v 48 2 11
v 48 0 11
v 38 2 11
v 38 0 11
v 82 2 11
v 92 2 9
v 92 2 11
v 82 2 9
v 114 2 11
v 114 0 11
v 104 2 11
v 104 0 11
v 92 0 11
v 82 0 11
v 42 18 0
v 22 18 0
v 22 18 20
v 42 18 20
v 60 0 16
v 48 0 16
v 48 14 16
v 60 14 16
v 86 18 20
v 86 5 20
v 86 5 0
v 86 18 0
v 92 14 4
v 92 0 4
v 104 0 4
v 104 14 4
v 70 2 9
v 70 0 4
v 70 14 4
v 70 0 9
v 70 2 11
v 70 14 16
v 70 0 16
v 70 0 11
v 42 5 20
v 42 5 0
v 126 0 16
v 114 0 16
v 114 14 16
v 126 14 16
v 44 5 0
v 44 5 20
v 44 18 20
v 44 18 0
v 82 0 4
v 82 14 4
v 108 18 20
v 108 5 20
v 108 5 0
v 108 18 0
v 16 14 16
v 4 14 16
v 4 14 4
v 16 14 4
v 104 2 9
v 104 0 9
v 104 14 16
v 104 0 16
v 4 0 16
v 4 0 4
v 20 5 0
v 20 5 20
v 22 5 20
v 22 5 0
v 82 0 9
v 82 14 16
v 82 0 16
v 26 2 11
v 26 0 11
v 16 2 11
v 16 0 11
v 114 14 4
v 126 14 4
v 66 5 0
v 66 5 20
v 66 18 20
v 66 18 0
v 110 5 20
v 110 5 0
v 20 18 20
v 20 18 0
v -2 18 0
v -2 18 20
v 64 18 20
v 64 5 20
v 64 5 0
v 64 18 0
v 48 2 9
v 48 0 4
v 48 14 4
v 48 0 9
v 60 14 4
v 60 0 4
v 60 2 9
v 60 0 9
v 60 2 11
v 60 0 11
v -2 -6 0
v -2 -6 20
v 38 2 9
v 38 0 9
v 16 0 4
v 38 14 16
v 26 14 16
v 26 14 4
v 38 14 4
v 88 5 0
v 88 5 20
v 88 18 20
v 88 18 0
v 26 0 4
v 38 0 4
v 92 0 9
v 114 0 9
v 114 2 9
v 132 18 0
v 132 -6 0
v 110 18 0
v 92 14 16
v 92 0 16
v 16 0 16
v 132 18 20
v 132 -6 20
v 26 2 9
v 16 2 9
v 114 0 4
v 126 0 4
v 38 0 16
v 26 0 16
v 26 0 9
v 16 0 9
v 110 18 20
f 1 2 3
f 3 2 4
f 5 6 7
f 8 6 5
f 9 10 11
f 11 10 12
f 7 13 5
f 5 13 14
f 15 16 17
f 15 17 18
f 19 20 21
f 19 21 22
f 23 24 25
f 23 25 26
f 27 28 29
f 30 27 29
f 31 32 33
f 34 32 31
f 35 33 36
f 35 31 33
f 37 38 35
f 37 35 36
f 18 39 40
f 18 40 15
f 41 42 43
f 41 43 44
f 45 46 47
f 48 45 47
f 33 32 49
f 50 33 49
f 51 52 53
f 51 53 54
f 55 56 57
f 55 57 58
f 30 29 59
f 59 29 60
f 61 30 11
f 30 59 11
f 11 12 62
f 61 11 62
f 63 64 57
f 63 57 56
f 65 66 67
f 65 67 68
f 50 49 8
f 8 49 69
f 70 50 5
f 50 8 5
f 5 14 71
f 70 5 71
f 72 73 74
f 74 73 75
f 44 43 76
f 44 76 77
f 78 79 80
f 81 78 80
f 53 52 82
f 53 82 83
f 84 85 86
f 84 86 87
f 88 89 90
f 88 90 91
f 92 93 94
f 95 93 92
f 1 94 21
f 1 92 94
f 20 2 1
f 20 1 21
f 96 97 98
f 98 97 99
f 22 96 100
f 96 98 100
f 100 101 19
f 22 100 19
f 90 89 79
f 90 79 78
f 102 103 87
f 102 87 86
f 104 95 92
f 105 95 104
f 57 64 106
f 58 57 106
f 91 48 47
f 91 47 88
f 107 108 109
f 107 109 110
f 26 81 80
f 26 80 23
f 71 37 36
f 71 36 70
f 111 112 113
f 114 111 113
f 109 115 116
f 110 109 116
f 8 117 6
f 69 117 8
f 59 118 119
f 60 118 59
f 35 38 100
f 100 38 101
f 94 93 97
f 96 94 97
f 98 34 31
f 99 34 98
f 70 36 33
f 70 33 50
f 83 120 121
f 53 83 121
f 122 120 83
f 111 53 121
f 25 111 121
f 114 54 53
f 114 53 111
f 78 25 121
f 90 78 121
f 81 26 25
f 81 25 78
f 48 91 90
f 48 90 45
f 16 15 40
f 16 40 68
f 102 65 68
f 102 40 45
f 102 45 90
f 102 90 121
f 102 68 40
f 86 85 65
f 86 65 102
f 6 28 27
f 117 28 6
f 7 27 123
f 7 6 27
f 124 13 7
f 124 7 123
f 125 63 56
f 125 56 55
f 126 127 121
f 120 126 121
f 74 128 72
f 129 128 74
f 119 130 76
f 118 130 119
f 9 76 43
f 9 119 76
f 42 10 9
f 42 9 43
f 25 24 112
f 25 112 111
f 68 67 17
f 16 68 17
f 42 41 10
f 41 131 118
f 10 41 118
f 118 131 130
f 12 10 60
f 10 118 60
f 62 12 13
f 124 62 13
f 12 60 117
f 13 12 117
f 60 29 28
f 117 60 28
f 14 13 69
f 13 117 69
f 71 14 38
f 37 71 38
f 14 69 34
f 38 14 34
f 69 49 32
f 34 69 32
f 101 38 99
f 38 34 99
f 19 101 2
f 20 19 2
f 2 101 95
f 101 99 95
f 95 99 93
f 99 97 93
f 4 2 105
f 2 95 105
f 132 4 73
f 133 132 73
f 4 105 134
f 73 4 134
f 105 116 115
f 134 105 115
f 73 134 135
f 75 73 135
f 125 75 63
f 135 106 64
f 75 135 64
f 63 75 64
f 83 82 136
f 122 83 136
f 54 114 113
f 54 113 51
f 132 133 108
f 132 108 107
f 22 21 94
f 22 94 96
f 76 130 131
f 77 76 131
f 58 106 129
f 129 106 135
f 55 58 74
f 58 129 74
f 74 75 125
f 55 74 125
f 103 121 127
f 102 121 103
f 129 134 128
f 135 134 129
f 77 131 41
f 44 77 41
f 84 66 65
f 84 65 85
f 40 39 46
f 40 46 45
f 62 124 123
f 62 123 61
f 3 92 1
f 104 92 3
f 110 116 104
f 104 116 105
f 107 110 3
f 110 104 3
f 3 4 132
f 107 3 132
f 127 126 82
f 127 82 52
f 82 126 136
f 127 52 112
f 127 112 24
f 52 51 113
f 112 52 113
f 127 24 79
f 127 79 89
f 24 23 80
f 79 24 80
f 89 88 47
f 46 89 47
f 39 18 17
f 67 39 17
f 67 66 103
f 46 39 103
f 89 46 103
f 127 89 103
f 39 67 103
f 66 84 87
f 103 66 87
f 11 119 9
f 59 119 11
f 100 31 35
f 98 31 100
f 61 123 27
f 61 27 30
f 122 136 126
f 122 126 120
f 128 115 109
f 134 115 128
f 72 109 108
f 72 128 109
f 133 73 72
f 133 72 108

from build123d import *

# Parameters (mm, degrees)
SKETCH1_W           = 20
SKETCH1_H           = 18
BOSS_EXTRUDE1_DEPTH = 20
SKETCH2_W           = 12
SKETCH2_H           = 12
CUT_EXTRUDE1_DEPTH  = 14
SKETCH3_W           = 20
SKETCH3_H           = 5
BOSS_EXTRUDE2_DEPTH = 2
LPATTERN1_COUNT     = 6
LPATTERN1_PITCH     = 22
SKETCH4_W           = 20
SKETCH4_H           = 13
BOSS_EXTRUDE3_DEPTH = 2
SKETCH5_W           = 20
SKETCH5_H           = 18
BOSS_EXTRUDE4_DEPTH = 2
SKETCH6_W           = 122
SKETCH6_H           = 2
CUT_EXTRUDE2_DEPTH  = 2
SKETCH7_W           = 134
SKETCH7_H           = 20
BOSS_EXTRUDE5_DEPTH = 6


with BuildPart() as part:
    # Sketch1 → Boss-Extrude1 (new body)
    with BuildSketch(Plane.XY):
        with Locations((10, 9)):
            Rectangle(SKETCH1_W, SKETCH1_H)
    extrude(amount=BOSS_EXTRUDE1_DEPTH)

    # Sketch2 → Cut-Extrude1 (cut)
    with BuildSketch(Plane.XZ):
        with Locations((10, 10)):
            Rectangle(SKETCH2_W, SKETCH2_H)
    extrude(amount=-CUT_EXTRUDE1_DEPTH, mode=Mode.SUBTRACT)

    # Sketch3 → Boss-Extrude2 (add)
    with BuildSketch(Plane(origin=(20, 0, 0), x_dir=(0, 0, -1), z_dir=(1, 0, 0))):
        with Locations((-10, 2.5)):
            Rectangle(SKETCH3_W, SKETCH3_H)
    extrude(amount=BOSS_EXTRUDE2_DEPTH)


with BuildPart() as lpattern1_1:
    # LPattern1: pattern copy
    add(part.part.moved(Location(Vector(1, 0, 0) * (1 * LPATTERN1_PITCH))))


with BuildPart() as lpattern1_2:
    # LPattern1: pattern copy
    add(part.part.moved(Location(Vector(1, 0, 0) * (2 * LPATTERN1_PITCH))))


with BuildPart() as lpattern1_3:
    # LPattern1: pattern copy
    add(part.part.moved(Location(Vector(1, 0, 0) * (3 * LPATTERN1_PITCH))))


with BuildPart() as lpattern1_4:
    # LPattern1: pattern copy
    add(part.part.moved(Location(Vector(1, 0, 0) * (4 * LPATTERN1_PITCH))))


with BuildPart() as lpattern1_5:
    # LPattern1: pattern copy
    add(part.part.moved(Location(Vector(1, 0, 0) * (5 * LPATTERN1_PITCH))))


with BuildPart() as lpattern1_4_1:
    add(lpattern1_4.part)

    # Combine1: union LPattern1_5, part, LPattern1_1, LPattern1_2, LPattern1_3
    add(lpattern1_5.part)
    add(part.part)
    add(lpattern1_1.part)
    add(lpattern1_2.part)
    add(lpattern1_3.part)

    # Sketch4 → Boss-Extrude3 (add)
    with BuildSketch(Plane(origin=(130, 0, 0), x_dir=(0, 0, -1), z_dir=(1, 0, 0))):
        with Locations((-10, 11.5)):
            Rectangle(SKETCH4_W, SKETCH4_H)
    extrude(amount=BOSS_EXTRUDE3_DEPTH)

    # Sketch5 → Boss-Extrude4 (add)
    with BuildSketch(Plane.ZY):
        with Locations((10, 9)):
            Rectangle(SKETCH5_W, SKETCH5_H)
    extrude(amount=BOSS_EXTRUDE4_DEPTH)

    # Sketch6 → Cut-Extrude2 (cut)
    with BuildSketch(Plane(origin=(0, 0, 0), x_dir=(-1, 0, 0), z_dir=(0, -1, 0))):
        with Locations((-65, -10)):
            Rectangle(SKETCH6_W, SKETCH6_H)
    extrude(amount=-CUT_EXTRUDE2_DEPTH, mode=Mode.SUBTRACT)

    # Sketch7 → Boss-Extrude5 (add)
    with BuildSketch(Plane(origin=(0, 0, 0), x_dir=(-1, 0, 0), z_dir=(0, -1, 0))):
        with Locations((-65, -10)):
            Rectangle(SKETCH7_W, SKETCH7_H)
    extrude(amount=BOSS_EXTRUDE5_DEPTH)


solid = lpattern1_4_1.part
